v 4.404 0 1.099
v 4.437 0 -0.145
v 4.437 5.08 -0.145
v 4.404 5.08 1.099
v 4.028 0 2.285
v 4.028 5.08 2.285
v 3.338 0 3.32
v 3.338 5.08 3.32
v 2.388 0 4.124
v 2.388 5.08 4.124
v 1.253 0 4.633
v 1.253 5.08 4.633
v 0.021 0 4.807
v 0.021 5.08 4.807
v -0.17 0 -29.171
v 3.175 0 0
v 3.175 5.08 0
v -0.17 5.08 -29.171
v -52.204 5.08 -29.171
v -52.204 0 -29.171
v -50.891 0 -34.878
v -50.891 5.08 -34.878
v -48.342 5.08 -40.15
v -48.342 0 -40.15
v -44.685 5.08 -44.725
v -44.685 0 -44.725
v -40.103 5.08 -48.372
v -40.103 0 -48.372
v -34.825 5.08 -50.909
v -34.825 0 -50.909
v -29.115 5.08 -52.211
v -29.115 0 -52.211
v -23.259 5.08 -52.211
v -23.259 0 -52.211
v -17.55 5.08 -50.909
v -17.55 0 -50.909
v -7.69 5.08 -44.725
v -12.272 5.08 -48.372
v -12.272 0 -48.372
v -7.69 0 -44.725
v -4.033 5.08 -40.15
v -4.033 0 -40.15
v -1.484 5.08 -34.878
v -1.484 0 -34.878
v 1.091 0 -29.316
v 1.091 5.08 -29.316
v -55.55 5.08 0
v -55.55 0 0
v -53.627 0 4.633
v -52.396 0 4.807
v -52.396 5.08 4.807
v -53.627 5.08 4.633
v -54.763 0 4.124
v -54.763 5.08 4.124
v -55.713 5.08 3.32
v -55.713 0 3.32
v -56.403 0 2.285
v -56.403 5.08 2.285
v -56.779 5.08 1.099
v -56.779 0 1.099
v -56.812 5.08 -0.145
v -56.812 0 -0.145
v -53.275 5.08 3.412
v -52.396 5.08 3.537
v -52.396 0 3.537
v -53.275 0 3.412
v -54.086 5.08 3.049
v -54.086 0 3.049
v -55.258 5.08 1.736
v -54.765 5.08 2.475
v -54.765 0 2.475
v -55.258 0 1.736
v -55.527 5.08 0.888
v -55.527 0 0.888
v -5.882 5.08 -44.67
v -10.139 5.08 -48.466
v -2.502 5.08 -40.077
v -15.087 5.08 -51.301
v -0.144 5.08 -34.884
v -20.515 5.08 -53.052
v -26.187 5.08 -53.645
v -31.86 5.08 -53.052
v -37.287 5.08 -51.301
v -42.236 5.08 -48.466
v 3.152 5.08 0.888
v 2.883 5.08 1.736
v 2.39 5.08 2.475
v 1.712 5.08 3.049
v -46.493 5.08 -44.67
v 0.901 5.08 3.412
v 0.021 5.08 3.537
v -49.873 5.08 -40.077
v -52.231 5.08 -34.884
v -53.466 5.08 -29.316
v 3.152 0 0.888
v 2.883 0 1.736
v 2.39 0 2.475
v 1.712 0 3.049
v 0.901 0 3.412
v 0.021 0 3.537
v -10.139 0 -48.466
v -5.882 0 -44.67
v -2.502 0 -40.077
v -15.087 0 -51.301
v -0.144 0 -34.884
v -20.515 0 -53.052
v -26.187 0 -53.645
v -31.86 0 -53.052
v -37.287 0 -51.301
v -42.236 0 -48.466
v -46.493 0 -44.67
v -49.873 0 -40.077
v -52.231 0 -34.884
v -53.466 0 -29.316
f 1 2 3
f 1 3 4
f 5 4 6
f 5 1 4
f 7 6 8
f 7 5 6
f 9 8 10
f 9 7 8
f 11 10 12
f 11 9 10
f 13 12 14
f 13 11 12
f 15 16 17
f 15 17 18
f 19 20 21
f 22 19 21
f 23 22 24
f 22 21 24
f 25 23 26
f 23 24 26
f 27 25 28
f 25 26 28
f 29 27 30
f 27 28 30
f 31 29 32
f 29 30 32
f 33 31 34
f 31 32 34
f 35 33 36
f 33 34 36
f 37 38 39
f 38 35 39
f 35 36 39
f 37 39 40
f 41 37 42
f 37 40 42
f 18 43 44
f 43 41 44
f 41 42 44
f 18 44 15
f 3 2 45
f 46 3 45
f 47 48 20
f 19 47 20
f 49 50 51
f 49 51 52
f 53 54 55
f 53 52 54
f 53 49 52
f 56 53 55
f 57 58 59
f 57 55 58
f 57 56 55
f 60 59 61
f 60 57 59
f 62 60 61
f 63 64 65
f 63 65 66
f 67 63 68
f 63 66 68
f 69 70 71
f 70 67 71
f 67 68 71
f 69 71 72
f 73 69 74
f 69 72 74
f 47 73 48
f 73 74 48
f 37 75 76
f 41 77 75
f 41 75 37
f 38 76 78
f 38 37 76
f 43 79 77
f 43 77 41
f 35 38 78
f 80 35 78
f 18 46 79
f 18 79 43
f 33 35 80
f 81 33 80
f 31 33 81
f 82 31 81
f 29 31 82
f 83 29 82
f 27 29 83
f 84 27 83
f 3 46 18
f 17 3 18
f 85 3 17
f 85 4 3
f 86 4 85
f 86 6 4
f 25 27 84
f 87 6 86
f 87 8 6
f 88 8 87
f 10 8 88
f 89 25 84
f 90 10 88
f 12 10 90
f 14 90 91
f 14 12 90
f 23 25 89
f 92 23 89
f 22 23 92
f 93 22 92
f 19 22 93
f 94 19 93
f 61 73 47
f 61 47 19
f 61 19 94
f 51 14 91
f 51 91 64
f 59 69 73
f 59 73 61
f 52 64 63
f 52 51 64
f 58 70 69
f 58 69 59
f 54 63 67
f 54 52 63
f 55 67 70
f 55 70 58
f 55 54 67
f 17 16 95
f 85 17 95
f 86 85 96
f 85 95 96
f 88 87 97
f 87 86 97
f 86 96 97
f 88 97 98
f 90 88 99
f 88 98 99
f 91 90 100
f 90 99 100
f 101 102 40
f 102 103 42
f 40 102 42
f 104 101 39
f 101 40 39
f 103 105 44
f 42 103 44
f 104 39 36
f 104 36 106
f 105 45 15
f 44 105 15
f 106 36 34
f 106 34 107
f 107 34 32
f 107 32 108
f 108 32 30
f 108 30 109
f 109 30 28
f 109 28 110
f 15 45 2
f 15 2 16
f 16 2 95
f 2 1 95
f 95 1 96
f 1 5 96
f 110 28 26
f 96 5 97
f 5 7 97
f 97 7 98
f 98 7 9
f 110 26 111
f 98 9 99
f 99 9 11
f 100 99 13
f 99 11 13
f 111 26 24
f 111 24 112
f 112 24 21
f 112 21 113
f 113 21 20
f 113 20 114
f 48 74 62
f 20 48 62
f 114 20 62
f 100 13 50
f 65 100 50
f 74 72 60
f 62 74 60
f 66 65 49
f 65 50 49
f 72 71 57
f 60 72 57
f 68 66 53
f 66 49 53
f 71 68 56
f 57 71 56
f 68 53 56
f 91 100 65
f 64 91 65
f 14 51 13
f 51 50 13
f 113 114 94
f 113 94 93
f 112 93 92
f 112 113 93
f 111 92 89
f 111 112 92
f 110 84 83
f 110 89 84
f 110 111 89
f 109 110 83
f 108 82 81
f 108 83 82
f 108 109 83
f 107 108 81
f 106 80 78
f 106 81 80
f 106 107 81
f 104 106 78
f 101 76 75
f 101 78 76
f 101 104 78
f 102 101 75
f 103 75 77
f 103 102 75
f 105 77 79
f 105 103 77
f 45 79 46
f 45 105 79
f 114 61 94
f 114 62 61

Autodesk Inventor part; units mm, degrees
ref_plane "YZ Plane" through (0, 0, 0) normal (1, 0, 0) x (0, 1, 0)
ref_plane "XZ Plane" through (0, 0, 0) normal (0, 1, 0) x (-1, 0, 0)
ref_plane "XY Plane" through (0, 0, 0) normal (0, 0, 1) x (1, 0, 0)
sketch "Sketch1" plane through (0, 0, 0) normal (0, 1, 0) x (-1, 0, 0)
  line L0 (0, 0) -> (52.3748, 0) construction
  arc A0 (52.2043, -29.1712) -> (0.1705, -29.1712) centre (26.1874, -26.1874) ccw construction
  line L1 (0, 0) -> (-6.35, 0) construction
  line L2 (52.3748, 0) -> (58.7248, 0) construction
  line L3 (0, 0) -> (0, -26.1874) construction
  line L4 (52.3748, 0) -> (52.3748, -26.1874) construction
  line L5 (-3.175, 0) -> (0.1705, -29.1712)
  line L6 (55.5498, 0) -> (52.2043, -29.1712)
  arc A1 (0.1705, -29.1712) -> (52.2043, -29.1712) centre (26.1874, -26.1874) ccw
  line L7 (-0.0207, 3.5368) -> (52.3955, 3.5368)
  arc A2 (-0.0207, 3.5368) -> (-3.175, 0) centre (-0.0207, 0.3618) ccw
  arc A3 (55.5498, 0) -> (52.3955, 3.5368) centre (52.3955, 0.3618) ccw
  arc A4 (56.8115, -0.1447) -> (52.3955, 4.8068) centre (52.3955, 0.3618) ccw
  line L8 (52.3955, 4.8068) -> (-0.0207, 4.8068)
  arc A5 (-0.0207, 4.8068) -> (-4.4367, -0.1447) centre (-0.0207, 0.3618) ccw
  line L9 (-4.4367, -0.1447) -> (-1.0912, -29.3159)
  arc A6 (-1.0912, -29.3159) -> (53.466, -29.3159) centre (26.1874, -26.1874) ccw
  line L10 (56.8115, -0.1447) -> (53.466, -29.3159)
  dimension "d0" = 52.3748
  dimension "d1" = 52.3748
  dimension "d2" = 6.35
  dimension "d3" = 6.35
  dimension "d4" = 3.175
  dimension "d5" = 1.27
  dimension "d6" = 1.27
  dimension "d7" = 1.27
  dimension "d8" = 1.27
extrude "Extrusion1" add sketch "Sketch1" along normal blind 5.08
properties part number "Clippard Zip Tie 2" material "ABS Plastic"
